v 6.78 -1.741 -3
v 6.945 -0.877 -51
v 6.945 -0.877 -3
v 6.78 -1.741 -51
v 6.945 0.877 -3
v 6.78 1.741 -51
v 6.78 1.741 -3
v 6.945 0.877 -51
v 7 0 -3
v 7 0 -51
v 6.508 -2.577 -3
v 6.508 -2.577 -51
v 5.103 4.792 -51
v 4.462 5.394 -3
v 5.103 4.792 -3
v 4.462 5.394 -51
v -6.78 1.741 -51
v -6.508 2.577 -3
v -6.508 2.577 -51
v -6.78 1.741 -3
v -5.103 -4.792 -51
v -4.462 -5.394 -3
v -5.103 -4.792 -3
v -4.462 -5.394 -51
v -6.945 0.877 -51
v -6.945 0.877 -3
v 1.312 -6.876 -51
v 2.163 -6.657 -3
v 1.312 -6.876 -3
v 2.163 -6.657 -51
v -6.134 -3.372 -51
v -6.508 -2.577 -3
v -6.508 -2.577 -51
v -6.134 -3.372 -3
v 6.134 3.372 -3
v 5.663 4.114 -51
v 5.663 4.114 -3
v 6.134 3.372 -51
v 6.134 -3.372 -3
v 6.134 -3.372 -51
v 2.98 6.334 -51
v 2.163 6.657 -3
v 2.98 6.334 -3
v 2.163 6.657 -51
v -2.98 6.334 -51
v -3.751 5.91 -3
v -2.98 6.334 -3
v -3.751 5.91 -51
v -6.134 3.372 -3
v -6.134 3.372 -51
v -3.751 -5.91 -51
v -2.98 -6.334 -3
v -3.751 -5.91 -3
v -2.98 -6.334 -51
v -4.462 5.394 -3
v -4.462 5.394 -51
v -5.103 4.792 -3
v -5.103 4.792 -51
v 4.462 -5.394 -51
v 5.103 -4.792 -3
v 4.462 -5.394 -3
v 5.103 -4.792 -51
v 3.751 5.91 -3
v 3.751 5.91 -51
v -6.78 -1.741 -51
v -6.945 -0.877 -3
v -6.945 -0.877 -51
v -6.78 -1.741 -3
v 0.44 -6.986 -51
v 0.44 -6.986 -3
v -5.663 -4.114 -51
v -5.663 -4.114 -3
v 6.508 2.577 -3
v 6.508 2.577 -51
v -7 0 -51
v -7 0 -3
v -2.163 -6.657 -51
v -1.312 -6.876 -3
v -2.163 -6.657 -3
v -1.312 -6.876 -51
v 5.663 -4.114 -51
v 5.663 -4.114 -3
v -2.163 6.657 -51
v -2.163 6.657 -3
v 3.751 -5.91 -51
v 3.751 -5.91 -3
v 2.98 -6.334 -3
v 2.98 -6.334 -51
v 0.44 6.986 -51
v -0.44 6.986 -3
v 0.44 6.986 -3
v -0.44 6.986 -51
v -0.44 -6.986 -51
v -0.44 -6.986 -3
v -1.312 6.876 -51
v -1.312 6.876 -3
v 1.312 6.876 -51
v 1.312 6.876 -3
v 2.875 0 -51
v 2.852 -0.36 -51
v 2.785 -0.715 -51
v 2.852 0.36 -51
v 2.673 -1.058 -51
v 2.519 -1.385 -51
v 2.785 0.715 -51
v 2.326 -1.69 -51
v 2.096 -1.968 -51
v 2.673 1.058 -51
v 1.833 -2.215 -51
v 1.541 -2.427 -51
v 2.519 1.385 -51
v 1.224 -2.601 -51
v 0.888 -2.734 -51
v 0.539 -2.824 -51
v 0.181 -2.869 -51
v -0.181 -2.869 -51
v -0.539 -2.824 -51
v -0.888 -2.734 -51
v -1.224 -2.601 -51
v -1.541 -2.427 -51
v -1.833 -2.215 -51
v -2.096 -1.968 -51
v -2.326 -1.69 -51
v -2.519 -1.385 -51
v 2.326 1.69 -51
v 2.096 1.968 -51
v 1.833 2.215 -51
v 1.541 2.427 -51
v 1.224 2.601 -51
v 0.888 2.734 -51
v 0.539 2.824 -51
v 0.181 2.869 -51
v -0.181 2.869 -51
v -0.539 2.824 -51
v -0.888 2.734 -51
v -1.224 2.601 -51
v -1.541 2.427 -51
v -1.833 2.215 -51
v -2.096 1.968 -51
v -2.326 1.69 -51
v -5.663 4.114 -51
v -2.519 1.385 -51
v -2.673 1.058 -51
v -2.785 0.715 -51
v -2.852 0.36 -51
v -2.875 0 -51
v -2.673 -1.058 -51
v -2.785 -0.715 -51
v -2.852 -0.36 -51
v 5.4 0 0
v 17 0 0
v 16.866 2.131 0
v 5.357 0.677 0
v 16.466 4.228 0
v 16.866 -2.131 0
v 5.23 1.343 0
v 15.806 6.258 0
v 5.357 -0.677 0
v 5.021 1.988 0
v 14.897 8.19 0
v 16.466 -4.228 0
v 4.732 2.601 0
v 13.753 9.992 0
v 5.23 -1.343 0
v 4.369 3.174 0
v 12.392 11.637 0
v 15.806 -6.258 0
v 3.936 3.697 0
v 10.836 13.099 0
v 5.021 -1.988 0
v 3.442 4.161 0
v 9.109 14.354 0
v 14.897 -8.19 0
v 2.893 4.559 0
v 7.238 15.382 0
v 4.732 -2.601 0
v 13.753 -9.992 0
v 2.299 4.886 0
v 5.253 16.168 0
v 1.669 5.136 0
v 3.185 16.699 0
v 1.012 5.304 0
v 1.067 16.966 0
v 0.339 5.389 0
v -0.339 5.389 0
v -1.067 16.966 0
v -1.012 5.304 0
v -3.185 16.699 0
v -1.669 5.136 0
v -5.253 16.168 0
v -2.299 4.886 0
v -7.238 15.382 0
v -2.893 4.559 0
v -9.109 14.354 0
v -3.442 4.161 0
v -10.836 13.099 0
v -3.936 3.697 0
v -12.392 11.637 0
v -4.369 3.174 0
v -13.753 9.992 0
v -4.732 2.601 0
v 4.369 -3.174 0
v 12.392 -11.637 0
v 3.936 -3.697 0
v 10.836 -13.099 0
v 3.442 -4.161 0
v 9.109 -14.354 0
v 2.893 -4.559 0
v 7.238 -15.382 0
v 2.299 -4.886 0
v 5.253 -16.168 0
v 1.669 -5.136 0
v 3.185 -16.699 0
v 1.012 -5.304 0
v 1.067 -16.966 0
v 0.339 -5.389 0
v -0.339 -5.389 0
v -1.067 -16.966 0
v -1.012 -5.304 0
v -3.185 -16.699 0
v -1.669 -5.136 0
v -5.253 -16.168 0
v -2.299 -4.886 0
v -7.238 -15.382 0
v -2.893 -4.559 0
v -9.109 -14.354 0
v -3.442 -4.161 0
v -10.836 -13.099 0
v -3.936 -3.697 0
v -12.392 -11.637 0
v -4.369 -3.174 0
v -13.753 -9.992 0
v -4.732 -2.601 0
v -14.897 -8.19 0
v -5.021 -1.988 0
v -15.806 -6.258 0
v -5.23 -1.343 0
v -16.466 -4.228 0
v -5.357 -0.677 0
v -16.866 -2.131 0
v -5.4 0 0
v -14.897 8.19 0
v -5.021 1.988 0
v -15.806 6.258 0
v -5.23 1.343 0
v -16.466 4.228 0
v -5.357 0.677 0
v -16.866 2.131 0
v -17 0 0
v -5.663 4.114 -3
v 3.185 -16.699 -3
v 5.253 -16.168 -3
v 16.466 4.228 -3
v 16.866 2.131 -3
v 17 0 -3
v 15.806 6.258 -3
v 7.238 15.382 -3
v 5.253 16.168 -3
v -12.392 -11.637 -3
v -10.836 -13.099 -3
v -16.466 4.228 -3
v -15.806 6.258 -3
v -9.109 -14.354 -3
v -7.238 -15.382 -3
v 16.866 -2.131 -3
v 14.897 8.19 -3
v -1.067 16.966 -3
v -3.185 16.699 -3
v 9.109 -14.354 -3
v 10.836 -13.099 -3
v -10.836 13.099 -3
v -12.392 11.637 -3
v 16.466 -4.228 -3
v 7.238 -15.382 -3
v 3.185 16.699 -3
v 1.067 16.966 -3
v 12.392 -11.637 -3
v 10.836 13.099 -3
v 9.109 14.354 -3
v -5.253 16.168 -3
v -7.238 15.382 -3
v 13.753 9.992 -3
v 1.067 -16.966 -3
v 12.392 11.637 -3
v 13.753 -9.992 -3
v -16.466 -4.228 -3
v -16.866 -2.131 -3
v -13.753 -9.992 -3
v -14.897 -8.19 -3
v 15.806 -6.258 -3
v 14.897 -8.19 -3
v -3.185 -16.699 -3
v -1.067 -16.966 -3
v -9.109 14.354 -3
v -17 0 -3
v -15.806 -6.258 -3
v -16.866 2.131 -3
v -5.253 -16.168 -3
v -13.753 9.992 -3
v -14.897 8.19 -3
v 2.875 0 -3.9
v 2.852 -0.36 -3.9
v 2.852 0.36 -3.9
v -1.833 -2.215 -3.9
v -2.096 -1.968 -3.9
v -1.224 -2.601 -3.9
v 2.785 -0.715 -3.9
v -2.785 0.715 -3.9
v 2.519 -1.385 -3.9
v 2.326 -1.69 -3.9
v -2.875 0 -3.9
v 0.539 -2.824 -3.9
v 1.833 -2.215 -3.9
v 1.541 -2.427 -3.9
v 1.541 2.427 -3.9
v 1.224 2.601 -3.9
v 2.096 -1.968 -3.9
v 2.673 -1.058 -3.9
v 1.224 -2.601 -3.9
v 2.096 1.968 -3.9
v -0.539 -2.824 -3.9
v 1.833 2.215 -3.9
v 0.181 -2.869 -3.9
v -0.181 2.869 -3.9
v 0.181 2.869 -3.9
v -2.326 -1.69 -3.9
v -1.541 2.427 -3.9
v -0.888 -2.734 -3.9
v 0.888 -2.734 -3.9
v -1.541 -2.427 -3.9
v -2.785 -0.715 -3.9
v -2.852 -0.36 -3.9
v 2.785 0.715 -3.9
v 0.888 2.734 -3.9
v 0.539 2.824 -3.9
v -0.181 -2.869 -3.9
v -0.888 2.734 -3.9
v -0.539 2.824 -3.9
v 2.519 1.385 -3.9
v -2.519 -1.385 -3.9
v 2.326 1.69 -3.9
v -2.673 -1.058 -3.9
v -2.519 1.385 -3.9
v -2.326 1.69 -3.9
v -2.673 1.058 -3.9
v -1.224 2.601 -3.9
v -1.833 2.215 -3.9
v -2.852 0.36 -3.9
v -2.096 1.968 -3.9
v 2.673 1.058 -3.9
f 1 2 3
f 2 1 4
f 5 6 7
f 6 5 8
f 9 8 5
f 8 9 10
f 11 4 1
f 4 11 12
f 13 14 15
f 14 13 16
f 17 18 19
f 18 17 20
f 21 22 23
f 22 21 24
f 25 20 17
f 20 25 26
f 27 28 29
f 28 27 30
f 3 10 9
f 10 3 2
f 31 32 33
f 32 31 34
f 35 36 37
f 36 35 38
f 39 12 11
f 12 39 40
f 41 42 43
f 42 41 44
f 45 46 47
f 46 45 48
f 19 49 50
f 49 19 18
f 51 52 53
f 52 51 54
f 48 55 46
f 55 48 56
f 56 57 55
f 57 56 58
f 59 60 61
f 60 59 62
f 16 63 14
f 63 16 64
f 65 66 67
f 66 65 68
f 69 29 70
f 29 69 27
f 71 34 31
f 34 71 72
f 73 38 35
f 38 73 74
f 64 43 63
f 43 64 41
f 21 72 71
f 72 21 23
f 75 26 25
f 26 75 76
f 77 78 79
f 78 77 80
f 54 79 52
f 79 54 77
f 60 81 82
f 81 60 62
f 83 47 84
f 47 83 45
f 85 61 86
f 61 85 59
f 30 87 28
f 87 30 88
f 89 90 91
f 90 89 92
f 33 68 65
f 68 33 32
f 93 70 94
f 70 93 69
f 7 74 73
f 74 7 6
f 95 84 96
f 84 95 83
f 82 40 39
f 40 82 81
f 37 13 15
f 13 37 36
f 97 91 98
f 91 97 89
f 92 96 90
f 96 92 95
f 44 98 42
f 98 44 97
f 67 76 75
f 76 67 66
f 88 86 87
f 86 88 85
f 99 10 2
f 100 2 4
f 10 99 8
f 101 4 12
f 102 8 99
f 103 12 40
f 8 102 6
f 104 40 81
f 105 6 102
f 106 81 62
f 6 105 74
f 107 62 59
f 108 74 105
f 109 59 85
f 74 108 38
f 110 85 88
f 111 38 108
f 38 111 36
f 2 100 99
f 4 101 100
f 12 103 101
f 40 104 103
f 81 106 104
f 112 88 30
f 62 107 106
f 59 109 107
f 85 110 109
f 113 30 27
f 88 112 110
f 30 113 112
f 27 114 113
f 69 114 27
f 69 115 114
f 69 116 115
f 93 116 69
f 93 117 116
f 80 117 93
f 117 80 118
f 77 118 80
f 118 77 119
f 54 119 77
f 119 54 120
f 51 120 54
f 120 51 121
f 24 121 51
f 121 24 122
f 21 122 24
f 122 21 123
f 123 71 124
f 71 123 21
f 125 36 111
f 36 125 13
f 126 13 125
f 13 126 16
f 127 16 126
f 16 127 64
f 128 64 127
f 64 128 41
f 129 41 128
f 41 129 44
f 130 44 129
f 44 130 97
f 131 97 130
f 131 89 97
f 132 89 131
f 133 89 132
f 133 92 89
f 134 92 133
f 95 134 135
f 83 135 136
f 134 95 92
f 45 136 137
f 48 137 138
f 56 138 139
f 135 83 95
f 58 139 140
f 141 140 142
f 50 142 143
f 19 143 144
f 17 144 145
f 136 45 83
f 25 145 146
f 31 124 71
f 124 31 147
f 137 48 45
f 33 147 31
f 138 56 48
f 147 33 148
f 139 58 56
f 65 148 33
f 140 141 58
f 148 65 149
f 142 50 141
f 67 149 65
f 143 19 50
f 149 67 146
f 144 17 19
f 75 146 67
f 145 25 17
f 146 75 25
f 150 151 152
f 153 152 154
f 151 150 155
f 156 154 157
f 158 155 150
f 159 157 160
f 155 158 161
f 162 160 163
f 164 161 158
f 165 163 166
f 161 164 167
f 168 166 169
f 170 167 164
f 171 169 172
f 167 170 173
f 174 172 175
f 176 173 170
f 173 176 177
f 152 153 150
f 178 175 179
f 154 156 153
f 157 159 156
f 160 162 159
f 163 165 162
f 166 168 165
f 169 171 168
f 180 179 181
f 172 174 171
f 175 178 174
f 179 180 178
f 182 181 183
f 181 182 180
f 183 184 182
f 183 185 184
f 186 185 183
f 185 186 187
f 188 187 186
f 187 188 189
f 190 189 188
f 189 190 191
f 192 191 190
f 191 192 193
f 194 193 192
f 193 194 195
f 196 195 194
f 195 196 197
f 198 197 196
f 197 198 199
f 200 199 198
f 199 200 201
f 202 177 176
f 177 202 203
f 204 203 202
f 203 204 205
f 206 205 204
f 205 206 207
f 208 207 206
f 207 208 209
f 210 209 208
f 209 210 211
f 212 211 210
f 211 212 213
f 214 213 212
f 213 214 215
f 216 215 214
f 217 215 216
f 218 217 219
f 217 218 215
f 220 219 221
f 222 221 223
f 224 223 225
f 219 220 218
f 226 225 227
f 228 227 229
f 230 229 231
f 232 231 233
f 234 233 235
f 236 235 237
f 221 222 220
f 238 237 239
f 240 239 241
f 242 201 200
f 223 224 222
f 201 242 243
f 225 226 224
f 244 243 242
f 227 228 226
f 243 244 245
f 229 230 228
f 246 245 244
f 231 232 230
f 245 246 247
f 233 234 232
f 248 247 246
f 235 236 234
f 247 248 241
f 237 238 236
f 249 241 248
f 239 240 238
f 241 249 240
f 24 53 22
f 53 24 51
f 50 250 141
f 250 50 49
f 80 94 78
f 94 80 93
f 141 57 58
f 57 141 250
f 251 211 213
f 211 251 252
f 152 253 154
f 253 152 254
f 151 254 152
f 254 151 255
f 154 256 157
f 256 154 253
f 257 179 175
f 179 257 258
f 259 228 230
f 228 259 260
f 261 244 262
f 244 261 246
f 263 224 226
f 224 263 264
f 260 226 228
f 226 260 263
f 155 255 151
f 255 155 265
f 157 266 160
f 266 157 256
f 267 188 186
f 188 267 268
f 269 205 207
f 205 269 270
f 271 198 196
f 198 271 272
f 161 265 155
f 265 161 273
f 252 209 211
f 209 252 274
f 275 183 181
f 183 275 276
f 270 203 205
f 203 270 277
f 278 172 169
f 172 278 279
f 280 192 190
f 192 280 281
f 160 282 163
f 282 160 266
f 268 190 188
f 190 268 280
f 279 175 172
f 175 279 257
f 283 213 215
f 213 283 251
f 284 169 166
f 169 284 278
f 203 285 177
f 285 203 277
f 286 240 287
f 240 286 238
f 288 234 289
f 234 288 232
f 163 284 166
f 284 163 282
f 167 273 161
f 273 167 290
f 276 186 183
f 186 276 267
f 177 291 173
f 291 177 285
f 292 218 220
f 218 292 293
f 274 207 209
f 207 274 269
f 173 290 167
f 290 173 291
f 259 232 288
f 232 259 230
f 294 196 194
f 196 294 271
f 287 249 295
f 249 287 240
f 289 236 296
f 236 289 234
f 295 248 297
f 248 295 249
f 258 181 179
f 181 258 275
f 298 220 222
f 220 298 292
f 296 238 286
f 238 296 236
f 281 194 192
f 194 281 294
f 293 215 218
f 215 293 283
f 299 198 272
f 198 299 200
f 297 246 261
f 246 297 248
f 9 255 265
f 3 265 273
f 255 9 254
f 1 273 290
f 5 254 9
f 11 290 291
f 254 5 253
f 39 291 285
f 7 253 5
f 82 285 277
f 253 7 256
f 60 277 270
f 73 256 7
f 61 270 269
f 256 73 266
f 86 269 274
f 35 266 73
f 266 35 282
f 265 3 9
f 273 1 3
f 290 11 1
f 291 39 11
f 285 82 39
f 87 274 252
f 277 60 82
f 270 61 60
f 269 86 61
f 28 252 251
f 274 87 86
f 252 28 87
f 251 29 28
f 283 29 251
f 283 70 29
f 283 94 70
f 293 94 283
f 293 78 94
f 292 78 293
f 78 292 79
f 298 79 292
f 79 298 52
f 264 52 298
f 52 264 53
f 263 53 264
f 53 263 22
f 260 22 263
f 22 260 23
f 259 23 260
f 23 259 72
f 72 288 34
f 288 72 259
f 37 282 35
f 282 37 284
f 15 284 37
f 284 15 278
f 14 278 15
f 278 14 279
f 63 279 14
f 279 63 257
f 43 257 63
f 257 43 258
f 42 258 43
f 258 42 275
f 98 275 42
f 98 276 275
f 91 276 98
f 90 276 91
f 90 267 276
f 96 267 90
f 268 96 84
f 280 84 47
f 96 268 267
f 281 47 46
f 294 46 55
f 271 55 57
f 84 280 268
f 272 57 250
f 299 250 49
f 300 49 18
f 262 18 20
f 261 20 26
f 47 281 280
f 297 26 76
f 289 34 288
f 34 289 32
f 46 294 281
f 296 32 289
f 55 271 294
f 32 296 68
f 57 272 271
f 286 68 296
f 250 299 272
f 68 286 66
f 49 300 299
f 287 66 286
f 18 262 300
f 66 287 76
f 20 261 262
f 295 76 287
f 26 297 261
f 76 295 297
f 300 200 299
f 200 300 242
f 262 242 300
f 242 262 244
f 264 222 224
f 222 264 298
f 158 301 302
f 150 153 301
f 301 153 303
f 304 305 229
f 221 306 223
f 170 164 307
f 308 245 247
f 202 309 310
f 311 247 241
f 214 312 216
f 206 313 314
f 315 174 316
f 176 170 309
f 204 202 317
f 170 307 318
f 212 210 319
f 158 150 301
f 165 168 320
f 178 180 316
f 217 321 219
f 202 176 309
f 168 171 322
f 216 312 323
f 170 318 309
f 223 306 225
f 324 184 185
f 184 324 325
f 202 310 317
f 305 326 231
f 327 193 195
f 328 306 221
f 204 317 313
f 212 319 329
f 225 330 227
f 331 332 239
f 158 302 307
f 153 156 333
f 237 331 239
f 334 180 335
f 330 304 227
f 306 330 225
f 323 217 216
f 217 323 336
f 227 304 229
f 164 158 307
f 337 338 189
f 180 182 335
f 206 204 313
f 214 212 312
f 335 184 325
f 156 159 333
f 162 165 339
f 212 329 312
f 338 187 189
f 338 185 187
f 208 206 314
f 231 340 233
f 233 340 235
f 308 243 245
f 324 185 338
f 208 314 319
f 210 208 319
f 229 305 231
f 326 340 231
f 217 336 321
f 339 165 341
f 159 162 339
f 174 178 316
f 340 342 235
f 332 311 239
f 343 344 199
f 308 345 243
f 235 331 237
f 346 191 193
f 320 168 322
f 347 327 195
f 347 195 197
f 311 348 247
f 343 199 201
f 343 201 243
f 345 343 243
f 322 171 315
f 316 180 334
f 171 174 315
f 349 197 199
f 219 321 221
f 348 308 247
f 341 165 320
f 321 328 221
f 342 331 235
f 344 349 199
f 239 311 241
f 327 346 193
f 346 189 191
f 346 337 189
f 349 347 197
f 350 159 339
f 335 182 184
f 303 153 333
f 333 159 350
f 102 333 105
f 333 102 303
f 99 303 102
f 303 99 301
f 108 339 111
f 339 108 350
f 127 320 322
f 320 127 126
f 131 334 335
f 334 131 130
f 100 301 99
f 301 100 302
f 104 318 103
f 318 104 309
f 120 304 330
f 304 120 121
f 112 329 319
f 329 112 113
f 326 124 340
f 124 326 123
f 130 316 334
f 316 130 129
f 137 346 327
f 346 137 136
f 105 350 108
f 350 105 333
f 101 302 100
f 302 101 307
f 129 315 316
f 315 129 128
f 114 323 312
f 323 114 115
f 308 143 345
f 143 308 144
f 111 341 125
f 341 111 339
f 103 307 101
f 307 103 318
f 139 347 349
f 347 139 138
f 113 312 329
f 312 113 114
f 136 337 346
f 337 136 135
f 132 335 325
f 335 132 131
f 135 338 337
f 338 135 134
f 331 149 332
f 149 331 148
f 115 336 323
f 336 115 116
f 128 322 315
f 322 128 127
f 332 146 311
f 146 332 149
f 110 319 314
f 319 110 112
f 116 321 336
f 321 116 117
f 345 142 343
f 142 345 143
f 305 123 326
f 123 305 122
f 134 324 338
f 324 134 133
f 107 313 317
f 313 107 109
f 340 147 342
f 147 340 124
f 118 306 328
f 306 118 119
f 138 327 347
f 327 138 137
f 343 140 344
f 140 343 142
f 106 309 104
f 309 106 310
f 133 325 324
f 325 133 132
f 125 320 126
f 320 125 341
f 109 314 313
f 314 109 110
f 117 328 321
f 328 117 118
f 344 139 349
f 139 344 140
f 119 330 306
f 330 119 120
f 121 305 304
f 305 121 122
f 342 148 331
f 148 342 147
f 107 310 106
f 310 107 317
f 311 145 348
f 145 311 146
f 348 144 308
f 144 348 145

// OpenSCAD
$fn = 50;


difference() {
	union() {
		translate(v = [0, 0, -51.0000000000]) {
			cylinder(h = 51, r = 7.0000000000);
		}
		translate(v = [0, 0, -3.0000000000]) {
			cylinder(h = 3, r = 17.0000000000);
		}
	}
	union() {
		translate(v = [0, 0, 0]) {
			rotate(a = [0, 0, 0]) {
				difference() {
					union() {
						#translate(v = [0, 0, -51.0000000000]) {
							cylinder(h = 51, r = 2.6000000000);
						}
						#translate(v = [0, 0, -3.9000000000]) {
							cylinder(h = 3.9000000000, r1 = 2.8750000000, r2 = 5.4000000000);
						}
						#translate(v = [0, 0, -51.0000000000]) {
							cylinder(h = 51, r = 2.8750000000);
						}
						#translate(v = [0, 0, -51.0000000000]) {
							cylinder(h = 51, r = 2.6000000000);
						}
					}
					union();
				}
			}
		}
	}
}
